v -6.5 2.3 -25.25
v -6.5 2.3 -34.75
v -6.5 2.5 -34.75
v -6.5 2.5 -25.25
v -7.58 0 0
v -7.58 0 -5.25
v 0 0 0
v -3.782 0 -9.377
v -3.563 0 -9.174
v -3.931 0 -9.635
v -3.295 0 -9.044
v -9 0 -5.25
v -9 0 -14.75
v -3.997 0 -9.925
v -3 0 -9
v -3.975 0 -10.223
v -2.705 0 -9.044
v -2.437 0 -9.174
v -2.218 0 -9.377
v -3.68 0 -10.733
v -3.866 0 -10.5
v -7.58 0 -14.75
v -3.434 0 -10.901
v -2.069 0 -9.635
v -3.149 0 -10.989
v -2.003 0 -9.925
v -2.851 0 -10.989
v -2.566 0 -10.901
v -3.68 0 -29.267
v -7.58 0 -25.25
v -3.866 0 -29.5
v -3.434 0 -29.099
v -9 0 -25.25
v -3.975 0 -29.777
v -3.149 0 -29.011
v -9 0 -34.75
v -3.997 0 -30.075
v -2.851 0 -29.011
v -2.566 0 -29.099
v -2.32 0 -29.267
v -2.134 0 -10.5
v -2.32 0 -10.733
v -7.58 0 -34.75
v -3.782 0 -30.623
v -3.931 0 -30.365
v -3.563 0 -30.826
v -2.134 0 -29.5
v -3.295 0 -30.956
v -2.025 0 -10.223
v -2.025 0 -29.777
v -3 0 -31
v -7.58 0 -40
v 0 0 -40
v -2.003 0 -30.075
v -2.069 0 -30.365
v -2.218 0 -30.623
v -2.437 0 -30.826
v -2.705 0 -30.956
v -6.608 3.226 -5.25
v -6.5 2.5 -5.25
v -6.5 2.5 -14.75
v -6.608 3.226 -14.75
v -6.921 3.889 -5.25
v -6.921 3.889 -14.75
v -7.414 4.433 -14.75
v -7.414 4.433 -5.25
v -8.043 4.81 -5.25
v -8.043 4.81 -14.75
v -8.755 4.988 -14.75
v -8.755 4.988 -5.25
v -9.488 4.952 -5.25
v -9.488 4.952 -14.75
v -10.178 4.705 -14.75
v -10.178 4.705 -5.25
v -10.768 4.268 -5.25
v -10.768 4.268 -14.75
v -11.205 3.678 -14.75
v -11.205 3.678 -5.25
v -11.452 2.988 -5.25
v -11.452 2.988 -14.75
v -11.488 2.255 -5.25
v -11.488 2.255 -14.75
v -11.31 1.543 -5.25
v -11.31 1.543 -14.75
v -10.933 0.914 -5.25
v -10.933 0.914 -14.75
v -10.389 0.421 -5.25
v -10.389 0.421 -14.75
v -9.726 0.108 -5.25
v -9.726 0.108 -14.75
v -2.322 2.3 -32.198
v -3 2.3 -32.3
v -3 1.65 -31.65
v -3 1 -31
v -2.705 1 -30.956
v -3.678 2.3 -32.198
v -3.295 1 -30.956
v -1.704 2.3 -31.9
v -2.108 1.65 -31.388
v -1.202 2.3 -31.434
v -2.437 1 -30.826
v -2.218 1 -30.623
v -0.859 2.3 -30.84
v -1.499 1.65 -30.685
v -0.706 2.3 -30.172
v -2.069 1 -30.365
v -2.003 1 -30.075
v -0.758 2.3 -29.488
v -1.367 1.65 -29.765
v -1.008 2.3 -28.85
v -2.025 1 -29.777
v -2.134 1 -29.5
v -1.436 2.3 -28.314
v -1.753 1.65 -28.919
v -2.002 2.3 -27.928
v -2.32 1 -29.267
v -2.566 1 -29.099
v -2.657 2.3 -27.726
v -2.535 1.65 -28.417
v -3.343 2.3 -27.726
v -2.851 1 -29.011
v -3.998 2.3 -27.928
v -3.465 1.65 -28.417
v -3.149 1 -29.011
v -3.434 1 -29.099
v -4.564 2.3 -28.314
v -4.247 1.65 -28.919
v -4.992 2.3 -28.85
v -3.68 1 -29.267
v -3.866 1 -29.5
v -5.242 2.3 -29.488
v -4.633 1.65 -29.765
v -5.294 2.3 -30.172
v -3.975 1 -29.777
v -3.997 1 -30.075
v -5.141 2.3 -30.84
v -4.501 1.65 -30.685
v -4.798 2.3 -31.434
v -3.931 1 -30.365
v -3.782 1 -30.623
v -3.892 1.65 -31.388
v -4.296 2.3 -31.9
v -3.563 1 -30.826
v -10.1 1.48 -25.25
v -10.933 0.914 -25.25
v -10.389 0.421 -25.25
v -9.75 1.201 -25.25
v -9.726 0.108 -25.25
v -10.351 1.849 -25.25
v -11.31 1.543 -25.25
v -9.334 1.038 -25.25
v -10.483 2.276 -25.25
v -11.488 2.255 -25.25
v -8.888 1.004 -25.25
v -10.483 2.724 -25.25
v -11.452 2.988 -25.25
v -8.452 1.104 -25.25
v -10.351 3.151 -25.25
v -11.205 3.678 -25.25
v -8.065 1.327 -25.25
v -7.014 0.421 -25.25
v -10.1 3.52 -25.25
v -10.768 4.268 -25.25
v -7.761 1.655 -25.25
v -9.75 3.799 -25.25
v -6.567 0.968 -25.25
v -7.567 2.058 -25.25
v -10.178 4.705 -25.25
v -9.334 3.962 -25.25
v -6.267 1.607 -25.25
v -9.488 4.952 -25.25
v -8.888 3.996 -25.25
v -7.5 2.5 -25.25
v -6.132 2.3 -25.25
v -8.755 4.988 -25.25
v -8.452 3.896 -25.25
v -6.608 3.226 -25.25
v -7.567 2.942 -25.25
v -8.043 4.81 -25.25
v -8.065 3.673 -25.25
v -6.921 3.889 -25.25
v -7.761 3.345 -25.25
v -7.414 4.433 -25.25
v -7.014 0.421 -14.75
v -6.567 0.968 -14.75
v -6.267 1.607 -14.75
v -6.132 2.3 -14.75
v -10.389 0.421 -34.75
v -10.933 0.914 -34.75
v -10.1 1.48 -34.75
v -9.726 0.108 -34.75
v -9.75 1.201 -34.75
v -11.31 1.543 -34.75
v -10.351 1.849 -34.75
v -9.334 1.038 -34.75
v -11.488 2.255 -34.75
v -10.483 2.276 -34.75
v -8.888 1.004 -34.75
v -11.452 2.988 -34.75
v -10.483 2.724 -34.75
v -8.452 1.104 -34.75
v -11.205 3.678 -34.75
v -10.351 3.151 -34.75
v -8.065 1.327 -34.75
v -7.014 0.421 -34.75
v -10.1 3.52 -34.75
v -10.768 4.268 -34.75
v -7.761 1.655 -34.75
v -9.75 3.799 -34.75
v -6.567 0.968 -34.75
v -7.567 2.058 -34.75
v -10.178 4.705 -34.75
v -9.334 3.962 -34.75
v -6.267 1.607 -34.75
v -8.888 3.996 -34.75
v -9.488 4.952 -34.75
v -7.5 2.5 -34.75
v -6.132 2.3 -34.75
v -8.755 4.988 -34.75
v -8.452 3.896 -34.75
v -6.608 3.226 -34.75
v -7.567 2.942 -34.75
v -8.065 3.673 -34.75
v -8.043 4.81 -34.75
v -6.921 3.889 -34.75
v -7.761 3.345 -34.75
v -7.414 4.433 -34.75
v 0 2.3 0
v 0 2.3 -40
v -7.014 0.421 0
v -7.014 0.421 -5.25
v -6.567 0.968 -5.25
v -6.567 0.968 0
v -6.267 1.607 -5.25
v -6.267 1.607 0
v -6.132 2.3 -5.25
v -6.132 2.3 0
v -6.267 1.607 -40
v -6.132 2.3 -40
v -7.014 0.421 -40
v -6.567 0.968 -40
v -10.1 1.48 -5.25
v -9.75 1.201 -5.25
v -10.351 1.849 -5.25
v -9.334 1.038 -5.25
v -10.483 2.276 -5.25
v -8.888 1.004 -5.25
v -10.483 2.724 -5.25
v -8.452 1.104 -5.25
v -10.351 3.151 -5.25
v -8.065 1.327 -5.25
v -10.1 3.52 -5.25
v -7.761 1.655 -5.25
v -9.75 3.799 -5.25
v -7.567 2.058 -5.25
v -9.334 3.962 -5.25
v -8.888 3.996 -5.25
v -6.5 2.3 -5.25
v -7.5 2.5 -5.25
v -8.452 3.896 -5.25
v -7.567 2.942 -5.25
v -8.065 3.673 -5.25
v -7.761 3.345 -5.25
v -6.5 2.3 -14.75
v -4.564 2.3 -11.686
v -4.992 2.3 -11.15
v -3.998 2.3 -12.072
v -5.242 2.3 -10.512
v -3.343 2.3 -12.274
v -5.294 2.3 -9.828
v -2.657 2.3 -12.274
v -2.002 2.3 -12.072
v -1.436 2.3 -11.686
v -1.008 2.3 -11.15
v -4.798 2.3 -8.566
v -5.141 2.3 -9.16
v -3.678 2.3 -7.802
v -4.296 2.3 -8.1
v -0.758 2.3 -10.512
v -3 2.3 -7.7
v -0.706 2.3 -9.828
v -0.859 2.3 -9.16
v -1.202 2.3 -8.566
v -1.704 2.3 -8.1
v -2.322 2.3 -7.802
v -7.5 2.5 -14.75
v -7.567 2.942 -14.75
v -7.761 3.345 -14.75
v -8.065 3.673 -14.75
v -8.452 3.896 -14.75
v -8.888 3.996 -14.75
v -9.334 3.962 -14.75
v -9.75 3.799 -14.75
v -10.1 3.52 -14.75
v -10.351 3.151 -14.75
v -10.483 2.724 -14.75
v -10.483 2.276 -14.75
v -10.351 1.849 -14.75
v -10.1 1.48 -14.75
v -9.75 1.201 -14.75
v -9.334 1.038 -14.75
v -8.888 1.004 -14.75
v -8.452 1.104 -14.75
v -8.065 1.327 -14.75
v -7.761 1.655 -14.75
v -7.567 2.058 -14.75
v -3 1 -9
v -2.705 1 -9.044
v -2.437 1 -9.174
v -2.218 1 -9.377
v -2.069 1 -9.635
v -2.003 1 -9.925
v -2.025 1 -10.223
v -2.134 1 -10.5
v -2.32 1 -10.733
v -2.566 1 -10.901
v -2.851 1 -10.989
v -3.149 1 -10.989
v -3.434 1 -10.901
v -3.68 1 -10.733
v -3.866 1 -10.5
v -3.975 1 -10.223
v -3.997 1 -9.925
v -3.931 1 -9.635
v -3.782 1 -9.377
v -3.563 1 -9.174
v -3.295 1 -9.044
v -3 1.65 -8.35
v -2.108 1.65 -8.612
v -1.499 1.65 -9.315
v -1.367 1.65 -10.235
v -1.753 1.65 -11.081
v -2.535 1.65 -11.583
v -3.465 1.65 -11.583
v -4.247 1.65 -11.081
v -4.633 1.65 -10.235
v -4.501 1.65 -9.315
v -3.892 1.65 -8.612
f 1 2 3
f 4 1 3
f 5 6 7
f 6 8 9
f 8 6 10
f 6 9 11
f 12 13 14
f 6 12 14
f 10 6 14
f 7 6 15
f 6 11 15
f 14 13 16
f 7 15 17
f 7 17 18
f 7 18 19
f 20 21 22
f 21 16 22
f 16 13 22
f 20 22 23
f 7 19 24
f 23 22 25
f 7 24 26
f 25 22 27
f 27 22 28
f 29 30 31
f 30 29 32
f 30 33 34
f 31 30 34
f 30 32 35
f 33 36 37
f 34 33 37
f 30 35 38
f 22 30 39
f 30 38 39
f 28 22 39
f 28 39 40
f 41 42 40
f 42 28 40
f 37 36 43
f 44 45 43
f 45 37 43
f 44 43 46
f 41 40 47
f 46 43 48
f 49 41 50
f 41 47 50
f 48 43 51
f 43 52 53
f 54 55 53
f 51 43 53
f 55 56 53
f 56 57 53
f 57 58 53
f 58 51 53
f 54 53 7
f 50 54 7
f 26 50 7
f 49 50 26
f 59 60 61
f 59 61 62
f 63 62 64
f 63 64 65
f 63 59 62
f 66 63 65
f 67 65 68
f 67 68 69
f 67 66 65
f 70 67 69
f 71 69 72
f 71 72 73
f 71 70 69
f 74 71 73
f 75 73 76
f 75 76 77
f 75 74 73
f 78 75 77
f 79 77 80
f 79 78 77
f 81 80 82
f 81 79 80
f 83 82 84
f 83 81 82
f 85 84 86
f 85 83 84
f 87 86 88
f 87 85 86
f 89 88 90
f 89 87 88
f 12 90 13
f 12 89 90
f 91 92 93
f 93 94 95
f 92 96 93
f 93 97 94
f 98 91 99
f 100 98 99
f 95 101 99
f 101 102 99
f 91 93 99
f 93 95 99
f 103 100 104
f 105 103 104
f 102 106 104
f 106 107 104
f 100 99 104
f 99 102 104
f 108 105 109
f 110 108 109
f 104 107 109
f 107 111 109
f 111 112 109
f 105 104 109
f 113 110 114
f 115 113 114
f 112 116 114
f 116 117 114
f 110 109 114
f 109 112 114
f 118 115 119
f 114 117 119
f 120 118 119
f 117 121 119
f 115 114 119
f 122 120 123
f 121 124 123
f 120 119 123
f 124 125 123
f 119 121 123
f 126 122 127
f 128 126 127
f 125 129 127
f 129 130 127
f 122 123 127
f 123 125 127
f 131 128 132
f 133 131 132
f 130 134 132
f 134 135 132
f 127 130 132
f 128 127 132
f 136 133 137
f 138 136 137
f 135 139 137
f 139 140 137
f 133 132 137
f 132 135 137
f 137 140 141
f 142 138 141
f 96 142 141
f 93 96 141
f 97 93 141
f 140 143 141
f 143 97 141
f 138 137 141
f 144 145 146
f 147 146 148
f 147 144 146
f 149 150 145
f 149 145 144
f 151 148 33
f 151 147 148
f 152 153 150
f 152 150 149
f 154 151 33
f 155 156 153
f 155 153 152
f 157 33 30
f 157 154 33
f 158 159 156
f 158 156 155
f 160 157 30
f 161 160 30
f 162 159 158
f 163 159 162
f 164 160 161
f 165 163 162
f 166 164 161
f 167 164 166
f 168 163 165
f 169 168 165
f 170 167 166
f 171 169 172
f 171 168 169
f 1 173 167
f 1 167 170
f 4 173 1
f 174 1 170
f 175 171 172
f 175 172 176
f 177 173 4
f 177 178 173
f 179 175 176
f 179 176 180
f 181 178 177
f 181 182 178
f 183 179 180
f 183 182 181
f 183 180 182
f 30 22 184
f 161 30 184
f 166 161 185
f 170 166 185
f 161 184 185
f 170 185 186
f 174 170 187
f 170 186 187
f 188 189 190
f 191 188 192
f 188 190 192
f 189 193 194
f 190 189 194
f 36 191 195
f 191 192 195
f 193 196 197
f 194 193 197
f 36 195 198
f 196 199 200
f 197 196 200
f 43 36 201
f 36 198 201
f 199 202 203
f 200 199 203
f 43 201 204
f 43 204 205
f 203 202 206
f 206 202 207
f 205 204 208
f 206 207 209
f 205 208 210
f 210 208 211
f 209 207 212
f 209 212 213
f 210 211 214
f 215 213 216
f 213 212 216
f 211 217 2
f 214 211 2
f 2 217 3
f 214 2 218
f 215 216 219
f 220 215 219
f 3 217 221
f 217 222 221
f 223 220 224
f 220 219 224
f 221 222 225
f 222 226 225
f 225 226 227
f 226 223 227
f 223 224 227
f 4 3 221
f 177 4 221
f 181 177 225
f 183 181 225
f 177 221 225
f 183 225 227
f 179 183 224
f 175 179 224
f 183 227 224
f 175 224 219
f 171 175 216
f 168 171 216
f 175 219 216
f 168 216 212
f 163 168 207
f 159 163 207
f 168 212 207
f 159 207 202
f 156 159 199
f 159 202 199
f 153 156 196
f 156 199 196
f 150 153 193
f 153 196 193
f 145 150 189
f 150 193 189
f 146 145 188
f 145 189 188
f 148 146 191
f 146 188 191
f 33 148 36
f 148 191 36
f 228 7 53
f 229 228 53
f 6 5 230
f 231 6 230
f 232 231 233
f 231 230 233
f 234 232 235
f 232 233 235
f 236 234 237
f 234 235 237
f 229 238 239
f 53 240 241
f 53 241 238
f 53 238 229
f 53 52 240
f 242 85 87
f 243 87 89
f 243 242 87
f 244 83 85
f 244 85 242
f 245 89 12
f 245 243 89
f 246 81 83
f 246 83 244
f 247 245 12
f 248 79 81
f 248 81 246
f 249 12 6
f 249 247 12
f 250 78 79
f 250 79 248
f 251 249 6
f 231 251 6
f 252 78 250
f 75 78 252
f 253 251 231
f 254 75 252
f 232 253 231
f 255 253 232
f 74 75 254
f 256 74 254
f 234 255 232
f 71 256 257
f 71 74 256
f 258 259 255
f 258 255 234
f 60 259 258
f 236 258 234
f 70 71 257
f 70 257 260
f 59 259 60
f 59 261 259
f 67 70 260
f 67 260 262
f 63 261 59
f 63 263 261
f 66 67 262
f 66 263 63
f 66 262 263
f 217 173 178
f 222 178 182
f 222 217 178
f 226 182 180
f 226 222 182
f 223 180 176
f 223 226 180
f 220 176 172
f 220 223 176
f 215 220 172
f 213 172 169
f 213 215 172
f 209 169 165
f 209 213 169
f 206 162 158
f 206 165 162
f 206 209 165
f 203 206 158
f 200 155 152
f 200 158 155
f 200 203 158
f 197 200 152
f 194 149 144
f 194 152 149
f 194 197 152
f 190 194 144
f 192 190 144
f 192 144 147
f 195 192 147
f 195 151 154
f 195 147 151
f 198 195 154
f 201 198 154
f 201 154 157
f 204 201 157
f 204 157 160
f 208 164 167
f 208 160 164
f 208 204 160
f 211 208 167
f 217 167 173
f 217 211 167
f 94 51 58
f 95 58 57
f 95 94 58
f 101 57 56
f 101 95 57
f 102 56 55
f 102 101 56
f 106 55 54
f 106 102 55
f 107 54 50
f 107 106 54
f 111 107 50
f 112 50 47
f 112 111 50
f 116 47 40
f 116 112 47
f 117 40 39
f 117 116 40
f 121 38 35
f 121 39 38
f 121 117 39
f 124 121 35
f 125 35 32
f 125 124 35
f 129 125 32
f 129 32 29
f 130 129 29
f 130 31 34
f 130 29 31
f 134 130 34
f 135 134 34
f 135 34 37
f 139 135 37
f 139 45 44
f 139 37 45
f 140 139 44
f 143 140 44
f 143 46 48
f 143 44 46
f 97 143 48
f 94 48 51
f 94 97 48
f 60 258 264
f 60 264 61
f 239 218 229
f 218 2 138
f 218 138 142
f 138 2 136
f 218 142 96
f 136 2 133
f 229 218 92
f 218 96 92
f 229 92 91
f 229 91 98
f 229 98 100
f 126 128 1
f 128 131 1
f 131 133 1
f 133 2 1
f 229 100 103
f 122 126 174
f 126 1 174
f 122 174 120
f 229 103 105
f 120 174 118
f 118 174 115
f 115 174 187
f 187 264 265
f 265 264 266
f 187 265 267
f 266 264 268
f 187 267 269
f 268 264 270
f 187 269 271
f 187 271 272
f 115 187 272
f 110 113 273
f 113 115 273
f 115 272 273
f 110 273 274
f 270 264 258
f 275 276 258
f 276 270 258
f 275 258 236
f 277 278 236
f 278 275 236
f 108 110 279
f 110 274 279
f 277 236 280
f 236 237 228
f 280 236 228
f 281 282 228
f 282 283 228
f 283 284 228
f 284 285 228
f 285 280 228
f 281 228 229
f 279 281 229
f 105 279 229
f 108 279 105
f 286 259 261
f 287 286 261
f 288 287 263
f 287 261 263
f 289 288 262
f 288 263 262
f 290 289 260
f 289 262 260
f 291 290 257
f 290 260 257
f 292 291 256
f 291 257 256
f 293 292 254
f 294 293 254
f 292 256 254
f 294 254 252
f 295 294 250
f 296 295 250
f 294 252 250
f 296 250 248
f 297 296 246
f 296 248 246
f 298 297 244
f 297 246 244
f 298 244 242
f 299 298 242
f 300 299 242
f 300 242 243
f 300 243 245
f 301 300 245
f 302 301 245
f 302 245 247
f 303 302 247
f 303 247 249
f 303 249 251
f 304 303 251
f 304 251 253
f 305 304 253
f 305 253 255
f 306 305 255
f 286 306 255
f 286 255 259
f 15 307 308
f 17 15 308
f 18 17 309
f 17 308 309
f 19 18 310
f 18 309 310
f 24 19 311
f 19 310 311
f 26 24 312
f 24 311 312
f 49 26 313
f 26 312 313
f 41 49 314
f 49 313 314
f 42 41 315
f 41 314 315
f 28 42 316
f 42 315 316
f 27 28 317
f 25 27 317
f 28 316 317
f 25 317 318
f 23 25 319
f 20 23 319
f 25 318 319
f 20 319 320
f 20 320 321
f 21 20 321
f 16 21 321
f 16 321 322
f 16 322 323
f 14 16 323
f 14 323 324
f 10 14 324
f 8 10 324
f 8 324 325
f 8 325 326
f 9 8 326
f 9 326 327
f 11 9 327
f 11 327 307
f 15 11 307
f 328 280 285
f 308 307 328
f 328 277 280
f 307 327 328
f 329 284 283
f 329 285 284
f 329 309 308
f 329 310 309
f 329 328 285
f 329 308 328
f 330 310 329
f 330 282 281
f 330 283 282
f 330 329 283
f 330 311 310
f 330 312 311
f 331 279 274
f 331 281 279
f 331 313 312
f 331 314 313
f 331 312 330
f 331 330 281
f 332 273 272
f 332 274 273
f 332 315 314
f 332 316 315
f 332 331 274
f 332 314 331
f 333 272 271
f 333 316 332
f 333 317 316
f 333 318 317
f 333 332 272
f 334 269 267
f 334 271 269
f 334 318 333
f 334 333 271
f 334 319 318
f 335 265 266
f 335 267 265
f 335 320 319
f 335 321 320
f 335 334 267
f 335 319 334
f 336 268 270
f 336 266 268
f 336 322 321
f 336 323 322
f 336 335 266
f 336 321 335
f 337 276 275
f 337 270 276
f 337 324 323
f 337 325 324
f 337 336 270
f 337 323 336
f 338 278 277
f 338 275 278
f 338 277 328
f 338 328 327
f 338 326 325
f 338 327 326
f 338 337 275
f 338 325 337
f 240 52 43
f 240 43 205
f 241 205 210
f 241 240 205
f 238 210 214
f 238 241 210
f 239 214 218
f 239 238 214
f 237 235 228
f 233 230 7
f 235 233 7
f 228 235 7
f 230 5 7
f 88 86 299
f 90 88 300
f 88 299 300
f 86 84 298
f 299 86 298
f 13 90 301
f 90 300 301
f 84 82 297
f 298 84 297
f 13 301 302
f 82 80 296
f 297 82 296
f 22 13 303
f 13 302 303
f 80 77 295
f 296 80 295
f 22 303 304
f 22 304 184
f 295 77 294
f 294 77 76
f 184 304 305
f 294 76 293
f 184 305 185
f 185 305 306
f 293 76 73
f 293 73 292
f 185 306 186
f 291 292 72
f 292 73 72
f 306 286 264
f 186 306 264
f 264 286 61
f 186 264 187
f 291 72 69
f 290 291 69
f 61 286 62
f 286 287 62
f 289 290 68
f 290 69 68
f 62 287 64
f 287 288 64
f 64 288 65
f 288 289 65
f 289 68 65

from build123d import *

# Parameters (mm, degrees)
SKETCH1_W           = 9
SKETCH1_H           = 40
BOSS_EXTRUDE1_DEPTH = 2.5
BOSS_EXTRUDE2_START = -5.25
SKETCH2_R           = 2.5
BOSS_EXTRUDE2_DEPTH = 9.5
SKETCH3_R           = 1.5
CUT_EXTRUDE1_DEPTH  = 42.919565837
SKETCH4_R           = 2.875
CUT_EXTRUDE2_DEPTH  = 5.25
CUT_EXTRUDE3_START  = -14.75
SKETCH4_2_R         = 2.875
CUT_EXTRUDE3_DEPTH  = 5.25
SKETCH5_R           = 1
CUT_EXTRUDE4_DEPTH  = 42.695323479
CHAMFER1_SIZE       = 1.5
CHAMFER2_SIZE       = 1.5
SKETCH7_W           = 6.5
SKETCH7_H           = 0.2
CUT_EXTRUDE5_DEPTH  = 42.919565837


with BuildPart() as part:
    # Sketch1 → Boss-Extrude1 (new body)
    with BuildSketch(Plane(origin=(0, 0, 0), x_dir=(1, 0, 0), z_dir=(0, 1, 0))):
        with Locations((-4.5, 20)):
            Rectangle(SKETCH1_W, SKETCH1_H)
    extrude(amount=BOSS_EXTRUDE1_DEPTH)

    # Sketch2 → Boss-Extrude2 (add)
    with BuildSketch(Plane.XY.offset(BOSS_EXTRUDE2_START)):
        with Locations((-9, 2.5)):
            Circle(SKETCH2_R)
    boss_extrude2 = extrude(amount=-BOSS_EXTRUDE2_DEPTH)

    # Sketch3 → Cut-Extrude1 (cut, through all)
    with BuildSketch(Plane.XY):
        with Locations((-9, 2.5)):
            Circle(SKETCH3_R)
    cut_extrude1 = extrude(amount=-CUT_EXTRUDE1_DEPTH, mode=Mode.SUBTRACT)

    # Sketch4 → Cut-Extrude2 (cut)
    with BuildSketch(Plane.XY):
        with Locations((-9, 2.5)):
            Circle(SKETCH4_R)
    cut_extrude2 = extrude(amount=-CUT_EXTRUDE2_DEPTH, mode=Mode.SUBTRACT)

    # Sketch4<2> → Cut-Extrude3 (cut)
    with BuildSketch(Plane.XY.offset(CUT_EXTRUDE3_START)):
        with Locations((-9, 2.5)):
            Circle(SKETCH4_2_R)
    cut_extrude3 = extrude(amount=-CUT_EXTRUDE3_DEPTH, mode=Mode.SUBTRACT)

    # Mirror2: Boss-Extrude2, Cut-Extrude1, Cut-Extrude2, Cut-Extrude3 across plane
    add(boss_extrude2.mirror(Plane.XY.offset(-20)))
    add(cut_extrude1.mirror(Plane.XY.offset(-20)), mode=Mode.SUBTRACT)
    add(cut_extrude2.mirror(Plane.XY.offset(-20)), mode=Mode.SUBTRACT)
    add(cut_extrude3.mirror(Plane.XY.offset(-20)), mode=Mode.SUBTRACT)

    # Sketch5 → Cut-Extrude4 (cut, through all)
    with BuildSketch(Plane(origin=(0, 2.5, 0), x_dir=(1, 0, 0), z_dir=(0, 1, 0))):
        with Locations(Location((-3, 10, 0), (0, 0, 270))):
            Circle(SKETCH5_R)
    cut_extrude4 = extrude(amount=-CUT_EXTRUDE4_DEPTH, mode=Mode.SUBTRACT)

    # Mirror3: Cut-Extrude4 across plane
    add(cut_extrude4.mirror(Plane.XY.offset(-20)), mode=Mode.SUBTRACT)

    # Chamfer1
    chamfer1_edges = [part.edges().sort_by_distance(p)[0] for p in [
        (-3, 2.5, -29),
    ]]
    chamfer(chamfer1_edges, length=CHAMFER1_SIZE)

    # Chamfer2
    chamfer2_edges = [part.edges().sort_by_distance(p)[0] for p in [
        (-3, 2.5, -11),
    ]]
    chamfer(chamfer2_edges, length=CHAMFER2_SIZE)

    # Sketch7 → Cut-Extrude5 (cut, through all)
    with BuildSketch(Plane.XY):
        with Locations((-3.25, 2.4)):
            Rectangle(SKETCH7_W, SKETCH7_H)
    extrude(amount=-CUT_EXTRUDE5_DEPTH, mode=Mode.SUBTRACT)


solid = part.part
